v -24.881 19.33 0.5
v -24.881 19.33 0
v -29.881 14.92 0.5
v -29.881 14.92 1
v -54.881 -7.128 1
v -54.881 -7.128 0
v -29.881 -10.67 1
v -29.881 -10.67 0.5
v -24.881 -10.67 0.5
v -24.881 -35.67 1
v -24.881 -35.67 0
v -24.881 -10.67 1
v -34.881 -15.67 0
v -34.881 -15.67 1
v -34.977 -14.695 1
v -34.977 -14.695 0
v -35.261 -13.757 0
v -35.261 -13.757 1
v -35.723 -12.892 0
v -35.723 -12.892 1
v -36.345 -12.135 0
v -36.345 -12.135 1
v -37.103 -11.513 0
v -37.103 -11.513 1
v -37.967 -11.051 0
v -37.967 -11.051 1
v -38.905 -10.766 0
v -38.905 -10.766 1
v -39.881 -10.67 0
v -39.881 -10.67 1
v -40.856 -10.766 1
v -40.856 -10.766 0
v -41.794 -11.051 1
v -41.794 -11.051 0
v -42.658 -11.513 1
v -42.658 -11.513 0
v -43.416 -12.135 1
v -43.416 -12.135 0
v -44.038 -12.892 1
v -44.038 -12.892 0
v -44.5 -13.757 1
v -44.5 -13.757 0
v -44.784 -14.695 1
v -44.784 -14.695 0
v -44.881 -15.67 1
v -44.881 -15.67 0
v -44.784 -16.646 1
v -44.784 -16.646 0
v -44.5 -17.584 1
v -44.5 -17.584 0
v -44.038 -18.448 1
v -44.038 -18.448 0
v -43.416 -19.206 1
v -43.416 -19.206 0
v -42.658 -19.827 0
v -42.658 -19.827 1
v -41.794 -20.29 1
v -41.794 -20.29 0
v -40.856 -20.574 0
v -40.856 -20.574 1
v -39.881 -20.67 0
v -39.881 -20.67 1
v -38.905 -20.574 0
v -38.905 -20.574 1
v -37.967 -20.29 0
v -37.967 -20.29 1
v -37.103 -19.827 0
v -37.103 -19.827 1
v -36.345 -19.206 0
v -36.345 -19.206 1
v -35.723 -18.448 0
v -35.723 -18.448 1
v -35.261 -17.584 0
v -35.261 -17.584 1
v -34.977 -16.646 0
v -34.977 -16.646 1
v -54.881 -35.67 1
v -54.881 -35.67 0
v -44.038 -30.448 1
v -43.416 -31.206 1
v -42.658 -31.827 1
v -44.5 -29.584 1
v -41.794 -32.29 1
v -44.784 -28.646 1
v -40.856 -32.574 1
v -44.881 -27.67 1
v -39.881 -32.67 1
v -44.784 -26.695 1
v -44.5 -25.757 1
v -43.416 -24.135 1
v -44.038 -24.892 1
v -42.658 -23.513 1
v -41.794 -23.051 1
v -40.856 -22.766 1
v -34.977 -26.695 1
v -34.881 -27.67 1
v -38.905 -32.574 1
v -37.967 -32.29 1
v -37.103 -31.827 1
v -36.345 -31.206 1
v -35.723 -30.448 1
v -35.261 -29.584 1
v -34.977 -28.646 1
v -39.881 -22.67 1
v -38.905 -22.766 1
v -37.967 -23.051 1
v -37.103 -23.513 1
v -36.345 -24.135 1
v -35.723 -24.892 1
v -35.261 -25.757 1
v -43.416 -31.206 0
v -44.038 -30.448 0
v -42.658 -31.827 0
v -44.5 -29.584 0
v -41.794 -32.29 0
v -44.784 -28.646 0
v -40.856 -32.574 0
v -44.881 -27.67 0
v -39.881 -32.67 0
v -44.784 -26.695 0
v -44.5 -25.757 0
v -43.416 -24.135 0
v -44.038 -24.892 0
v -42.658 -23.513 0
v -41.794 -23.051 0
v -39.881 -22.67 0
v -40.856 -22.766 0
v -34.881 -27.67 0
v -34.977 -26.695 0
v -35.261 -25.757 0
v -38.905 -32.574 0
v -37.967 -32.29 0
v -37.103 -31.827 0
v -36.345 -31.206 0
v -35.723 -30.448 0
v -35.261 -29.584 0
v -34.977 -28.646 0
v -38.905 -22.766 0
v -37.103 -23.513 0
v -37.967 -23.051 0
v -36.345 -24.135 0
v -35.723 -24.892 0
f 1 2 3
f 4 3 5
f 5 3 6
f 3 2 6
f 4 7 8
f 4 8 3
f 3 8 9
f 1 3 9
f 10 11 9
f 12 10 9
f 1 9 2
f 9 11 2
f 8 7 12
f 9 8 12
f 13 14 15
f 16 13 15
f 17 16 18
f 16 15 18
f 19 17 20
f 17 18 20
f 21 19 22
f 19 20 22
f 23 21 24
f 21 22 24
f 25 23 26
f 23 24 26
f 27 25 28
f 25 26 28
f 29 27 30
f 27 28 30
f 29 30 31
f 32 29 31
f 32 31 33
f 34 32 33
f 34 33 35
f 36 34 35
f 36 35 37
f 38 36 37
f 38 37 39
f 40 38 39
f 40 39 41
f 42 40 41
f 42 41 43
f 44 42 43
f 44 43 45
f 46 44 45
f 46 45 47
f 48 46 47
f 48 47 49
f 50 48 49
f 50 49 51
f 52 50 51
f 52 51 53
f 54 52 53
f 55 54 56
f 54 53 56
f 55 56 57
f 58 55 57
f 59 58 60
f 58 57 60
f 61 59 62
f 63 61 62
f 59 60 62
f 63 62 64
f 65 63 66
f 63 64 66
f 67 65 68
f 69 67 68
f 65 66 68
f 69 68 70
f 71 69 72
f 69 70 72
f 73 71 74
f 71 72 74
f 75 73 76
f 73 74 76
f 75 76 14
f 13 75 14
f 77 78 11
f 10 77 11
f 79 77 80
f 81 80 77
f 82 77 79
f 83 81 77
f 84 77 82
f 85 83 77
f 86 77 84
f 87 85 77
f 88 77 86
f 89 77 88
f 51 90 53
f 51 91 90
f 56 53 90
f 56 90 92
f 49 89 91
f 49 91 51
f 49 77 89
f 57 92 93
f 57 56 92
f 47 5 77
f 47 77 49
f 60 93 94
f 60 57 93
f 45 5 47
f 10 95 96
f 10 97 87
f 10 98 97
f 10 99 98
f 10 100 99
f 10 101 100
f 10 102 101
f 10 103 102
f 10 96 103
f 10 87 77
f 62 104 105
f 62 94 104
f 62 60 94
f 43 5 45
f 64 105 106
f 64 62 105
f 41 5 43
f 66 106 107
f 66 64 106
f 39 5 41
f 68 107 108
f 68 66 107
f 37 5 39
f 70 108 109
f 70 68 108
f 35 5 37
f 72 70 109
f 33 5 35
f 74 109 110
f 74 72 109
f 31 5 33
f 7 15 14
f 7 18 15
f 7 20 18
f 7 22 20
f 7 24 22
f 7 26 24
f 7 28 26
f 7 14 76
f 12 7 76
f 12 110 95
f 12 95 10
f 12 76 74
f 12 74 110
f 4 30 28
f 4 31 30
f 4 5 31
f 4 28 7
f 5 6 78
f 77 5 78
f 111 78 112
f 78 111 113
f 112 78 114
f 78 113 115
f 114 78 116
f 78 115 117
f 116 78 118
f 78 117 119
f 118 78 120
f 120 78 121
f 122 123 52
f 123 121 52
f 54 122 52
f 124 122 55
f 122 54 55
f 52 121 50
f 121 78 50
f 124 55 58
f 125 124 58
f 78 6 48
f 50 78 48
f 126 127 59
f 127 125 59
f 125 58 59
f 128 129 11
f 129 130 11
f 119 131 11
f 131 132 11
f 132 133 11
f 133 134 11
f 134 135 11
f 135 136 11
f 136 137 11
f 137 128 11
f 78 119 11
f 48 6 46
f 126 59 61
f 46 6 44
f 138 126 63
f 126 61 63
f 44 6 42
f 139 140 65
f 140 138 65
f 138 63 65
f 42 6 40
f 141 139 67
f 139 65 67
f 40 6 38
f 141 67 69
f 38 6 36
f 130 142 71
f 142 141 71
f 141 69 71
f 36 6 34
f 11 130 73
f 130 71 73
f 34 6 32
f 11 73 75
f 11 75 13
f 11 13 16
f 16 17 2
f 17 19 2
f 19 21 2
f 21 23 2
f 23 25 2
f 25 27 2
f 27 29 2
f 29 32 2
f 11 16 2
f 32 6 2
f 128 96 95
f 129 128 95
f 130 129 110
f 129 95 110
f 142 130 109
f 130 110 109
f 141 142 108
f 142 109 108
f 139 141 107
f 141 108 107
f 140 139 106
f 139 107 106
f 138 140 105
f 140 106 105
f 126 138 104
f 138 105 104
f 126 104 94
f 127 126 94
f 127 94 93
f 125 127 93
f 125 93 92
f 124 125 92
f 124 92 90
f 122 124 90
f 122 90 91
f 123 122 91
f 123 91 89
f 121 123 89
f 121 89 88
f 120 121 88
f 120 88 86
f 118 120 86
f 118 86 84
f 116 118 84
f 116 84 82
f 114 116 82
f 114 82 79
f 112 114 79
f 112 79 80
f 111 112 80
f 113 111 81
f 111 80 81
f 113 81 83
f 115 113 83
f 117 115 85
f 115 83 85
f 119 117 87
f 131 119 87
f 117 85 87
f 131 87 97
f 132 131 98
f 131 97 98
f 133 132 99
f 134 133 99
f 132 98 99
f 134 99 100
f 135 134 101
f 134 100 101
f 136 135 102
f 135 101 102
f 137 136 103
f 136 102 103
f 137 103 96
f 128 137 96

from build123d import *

# Parameters (mm, degrees)
BOSS_EXTRUDE3_DEPTH = 1
SKETCH2_W           = 5
SKETCH2_H           = 30
CUT_EXTRUDE6_DEPTH  = 0.5
SKETCH3_R           = 5
CUT_EXTRUDE7_DEPTH  = 9


with BuildPart() as part:
    # Sketch1 → Boss-Extrude3 (new body)
    with BuildSketch(Plane.XY):
        Polygon((-24.880558789, 19.329851987), (-54.880558789, -7.127661123), (-54.880558789, -35.670148013), (-24.880558789, -35.670148013), align=None)
    extrude(amount=BOSS_EXTRUDE3_DEPTH)

    # Sketch2 → Cut-Extrude6 (cut)
    with BuildSketch(Plane.XY.offset(1)):
        with Locations((-27.380558789, 4.329851987)):
            Rectangle(SKETCH2_W, SKETCH2_H)
    extrude(amount=-CUT_EXTRUDE6_DEPTH, mode=Mode.SUBTRACT)

    # Sketch3 → Cut-Extrude7 (cut)
    with BuildSketch(Plane.XY.offset(1)):
        with Locations((-39.880558789, -27.670148013)):
            Circle(SKETCH3_R)
        with Locations((-39.880558789, -15.670148013)):
            Circle(SKETCH3_R)
    extrude(amount=-CUT_EXTRUDE7_DEPTH, mode=Mode.SUBTRACT)


solid = part.part
